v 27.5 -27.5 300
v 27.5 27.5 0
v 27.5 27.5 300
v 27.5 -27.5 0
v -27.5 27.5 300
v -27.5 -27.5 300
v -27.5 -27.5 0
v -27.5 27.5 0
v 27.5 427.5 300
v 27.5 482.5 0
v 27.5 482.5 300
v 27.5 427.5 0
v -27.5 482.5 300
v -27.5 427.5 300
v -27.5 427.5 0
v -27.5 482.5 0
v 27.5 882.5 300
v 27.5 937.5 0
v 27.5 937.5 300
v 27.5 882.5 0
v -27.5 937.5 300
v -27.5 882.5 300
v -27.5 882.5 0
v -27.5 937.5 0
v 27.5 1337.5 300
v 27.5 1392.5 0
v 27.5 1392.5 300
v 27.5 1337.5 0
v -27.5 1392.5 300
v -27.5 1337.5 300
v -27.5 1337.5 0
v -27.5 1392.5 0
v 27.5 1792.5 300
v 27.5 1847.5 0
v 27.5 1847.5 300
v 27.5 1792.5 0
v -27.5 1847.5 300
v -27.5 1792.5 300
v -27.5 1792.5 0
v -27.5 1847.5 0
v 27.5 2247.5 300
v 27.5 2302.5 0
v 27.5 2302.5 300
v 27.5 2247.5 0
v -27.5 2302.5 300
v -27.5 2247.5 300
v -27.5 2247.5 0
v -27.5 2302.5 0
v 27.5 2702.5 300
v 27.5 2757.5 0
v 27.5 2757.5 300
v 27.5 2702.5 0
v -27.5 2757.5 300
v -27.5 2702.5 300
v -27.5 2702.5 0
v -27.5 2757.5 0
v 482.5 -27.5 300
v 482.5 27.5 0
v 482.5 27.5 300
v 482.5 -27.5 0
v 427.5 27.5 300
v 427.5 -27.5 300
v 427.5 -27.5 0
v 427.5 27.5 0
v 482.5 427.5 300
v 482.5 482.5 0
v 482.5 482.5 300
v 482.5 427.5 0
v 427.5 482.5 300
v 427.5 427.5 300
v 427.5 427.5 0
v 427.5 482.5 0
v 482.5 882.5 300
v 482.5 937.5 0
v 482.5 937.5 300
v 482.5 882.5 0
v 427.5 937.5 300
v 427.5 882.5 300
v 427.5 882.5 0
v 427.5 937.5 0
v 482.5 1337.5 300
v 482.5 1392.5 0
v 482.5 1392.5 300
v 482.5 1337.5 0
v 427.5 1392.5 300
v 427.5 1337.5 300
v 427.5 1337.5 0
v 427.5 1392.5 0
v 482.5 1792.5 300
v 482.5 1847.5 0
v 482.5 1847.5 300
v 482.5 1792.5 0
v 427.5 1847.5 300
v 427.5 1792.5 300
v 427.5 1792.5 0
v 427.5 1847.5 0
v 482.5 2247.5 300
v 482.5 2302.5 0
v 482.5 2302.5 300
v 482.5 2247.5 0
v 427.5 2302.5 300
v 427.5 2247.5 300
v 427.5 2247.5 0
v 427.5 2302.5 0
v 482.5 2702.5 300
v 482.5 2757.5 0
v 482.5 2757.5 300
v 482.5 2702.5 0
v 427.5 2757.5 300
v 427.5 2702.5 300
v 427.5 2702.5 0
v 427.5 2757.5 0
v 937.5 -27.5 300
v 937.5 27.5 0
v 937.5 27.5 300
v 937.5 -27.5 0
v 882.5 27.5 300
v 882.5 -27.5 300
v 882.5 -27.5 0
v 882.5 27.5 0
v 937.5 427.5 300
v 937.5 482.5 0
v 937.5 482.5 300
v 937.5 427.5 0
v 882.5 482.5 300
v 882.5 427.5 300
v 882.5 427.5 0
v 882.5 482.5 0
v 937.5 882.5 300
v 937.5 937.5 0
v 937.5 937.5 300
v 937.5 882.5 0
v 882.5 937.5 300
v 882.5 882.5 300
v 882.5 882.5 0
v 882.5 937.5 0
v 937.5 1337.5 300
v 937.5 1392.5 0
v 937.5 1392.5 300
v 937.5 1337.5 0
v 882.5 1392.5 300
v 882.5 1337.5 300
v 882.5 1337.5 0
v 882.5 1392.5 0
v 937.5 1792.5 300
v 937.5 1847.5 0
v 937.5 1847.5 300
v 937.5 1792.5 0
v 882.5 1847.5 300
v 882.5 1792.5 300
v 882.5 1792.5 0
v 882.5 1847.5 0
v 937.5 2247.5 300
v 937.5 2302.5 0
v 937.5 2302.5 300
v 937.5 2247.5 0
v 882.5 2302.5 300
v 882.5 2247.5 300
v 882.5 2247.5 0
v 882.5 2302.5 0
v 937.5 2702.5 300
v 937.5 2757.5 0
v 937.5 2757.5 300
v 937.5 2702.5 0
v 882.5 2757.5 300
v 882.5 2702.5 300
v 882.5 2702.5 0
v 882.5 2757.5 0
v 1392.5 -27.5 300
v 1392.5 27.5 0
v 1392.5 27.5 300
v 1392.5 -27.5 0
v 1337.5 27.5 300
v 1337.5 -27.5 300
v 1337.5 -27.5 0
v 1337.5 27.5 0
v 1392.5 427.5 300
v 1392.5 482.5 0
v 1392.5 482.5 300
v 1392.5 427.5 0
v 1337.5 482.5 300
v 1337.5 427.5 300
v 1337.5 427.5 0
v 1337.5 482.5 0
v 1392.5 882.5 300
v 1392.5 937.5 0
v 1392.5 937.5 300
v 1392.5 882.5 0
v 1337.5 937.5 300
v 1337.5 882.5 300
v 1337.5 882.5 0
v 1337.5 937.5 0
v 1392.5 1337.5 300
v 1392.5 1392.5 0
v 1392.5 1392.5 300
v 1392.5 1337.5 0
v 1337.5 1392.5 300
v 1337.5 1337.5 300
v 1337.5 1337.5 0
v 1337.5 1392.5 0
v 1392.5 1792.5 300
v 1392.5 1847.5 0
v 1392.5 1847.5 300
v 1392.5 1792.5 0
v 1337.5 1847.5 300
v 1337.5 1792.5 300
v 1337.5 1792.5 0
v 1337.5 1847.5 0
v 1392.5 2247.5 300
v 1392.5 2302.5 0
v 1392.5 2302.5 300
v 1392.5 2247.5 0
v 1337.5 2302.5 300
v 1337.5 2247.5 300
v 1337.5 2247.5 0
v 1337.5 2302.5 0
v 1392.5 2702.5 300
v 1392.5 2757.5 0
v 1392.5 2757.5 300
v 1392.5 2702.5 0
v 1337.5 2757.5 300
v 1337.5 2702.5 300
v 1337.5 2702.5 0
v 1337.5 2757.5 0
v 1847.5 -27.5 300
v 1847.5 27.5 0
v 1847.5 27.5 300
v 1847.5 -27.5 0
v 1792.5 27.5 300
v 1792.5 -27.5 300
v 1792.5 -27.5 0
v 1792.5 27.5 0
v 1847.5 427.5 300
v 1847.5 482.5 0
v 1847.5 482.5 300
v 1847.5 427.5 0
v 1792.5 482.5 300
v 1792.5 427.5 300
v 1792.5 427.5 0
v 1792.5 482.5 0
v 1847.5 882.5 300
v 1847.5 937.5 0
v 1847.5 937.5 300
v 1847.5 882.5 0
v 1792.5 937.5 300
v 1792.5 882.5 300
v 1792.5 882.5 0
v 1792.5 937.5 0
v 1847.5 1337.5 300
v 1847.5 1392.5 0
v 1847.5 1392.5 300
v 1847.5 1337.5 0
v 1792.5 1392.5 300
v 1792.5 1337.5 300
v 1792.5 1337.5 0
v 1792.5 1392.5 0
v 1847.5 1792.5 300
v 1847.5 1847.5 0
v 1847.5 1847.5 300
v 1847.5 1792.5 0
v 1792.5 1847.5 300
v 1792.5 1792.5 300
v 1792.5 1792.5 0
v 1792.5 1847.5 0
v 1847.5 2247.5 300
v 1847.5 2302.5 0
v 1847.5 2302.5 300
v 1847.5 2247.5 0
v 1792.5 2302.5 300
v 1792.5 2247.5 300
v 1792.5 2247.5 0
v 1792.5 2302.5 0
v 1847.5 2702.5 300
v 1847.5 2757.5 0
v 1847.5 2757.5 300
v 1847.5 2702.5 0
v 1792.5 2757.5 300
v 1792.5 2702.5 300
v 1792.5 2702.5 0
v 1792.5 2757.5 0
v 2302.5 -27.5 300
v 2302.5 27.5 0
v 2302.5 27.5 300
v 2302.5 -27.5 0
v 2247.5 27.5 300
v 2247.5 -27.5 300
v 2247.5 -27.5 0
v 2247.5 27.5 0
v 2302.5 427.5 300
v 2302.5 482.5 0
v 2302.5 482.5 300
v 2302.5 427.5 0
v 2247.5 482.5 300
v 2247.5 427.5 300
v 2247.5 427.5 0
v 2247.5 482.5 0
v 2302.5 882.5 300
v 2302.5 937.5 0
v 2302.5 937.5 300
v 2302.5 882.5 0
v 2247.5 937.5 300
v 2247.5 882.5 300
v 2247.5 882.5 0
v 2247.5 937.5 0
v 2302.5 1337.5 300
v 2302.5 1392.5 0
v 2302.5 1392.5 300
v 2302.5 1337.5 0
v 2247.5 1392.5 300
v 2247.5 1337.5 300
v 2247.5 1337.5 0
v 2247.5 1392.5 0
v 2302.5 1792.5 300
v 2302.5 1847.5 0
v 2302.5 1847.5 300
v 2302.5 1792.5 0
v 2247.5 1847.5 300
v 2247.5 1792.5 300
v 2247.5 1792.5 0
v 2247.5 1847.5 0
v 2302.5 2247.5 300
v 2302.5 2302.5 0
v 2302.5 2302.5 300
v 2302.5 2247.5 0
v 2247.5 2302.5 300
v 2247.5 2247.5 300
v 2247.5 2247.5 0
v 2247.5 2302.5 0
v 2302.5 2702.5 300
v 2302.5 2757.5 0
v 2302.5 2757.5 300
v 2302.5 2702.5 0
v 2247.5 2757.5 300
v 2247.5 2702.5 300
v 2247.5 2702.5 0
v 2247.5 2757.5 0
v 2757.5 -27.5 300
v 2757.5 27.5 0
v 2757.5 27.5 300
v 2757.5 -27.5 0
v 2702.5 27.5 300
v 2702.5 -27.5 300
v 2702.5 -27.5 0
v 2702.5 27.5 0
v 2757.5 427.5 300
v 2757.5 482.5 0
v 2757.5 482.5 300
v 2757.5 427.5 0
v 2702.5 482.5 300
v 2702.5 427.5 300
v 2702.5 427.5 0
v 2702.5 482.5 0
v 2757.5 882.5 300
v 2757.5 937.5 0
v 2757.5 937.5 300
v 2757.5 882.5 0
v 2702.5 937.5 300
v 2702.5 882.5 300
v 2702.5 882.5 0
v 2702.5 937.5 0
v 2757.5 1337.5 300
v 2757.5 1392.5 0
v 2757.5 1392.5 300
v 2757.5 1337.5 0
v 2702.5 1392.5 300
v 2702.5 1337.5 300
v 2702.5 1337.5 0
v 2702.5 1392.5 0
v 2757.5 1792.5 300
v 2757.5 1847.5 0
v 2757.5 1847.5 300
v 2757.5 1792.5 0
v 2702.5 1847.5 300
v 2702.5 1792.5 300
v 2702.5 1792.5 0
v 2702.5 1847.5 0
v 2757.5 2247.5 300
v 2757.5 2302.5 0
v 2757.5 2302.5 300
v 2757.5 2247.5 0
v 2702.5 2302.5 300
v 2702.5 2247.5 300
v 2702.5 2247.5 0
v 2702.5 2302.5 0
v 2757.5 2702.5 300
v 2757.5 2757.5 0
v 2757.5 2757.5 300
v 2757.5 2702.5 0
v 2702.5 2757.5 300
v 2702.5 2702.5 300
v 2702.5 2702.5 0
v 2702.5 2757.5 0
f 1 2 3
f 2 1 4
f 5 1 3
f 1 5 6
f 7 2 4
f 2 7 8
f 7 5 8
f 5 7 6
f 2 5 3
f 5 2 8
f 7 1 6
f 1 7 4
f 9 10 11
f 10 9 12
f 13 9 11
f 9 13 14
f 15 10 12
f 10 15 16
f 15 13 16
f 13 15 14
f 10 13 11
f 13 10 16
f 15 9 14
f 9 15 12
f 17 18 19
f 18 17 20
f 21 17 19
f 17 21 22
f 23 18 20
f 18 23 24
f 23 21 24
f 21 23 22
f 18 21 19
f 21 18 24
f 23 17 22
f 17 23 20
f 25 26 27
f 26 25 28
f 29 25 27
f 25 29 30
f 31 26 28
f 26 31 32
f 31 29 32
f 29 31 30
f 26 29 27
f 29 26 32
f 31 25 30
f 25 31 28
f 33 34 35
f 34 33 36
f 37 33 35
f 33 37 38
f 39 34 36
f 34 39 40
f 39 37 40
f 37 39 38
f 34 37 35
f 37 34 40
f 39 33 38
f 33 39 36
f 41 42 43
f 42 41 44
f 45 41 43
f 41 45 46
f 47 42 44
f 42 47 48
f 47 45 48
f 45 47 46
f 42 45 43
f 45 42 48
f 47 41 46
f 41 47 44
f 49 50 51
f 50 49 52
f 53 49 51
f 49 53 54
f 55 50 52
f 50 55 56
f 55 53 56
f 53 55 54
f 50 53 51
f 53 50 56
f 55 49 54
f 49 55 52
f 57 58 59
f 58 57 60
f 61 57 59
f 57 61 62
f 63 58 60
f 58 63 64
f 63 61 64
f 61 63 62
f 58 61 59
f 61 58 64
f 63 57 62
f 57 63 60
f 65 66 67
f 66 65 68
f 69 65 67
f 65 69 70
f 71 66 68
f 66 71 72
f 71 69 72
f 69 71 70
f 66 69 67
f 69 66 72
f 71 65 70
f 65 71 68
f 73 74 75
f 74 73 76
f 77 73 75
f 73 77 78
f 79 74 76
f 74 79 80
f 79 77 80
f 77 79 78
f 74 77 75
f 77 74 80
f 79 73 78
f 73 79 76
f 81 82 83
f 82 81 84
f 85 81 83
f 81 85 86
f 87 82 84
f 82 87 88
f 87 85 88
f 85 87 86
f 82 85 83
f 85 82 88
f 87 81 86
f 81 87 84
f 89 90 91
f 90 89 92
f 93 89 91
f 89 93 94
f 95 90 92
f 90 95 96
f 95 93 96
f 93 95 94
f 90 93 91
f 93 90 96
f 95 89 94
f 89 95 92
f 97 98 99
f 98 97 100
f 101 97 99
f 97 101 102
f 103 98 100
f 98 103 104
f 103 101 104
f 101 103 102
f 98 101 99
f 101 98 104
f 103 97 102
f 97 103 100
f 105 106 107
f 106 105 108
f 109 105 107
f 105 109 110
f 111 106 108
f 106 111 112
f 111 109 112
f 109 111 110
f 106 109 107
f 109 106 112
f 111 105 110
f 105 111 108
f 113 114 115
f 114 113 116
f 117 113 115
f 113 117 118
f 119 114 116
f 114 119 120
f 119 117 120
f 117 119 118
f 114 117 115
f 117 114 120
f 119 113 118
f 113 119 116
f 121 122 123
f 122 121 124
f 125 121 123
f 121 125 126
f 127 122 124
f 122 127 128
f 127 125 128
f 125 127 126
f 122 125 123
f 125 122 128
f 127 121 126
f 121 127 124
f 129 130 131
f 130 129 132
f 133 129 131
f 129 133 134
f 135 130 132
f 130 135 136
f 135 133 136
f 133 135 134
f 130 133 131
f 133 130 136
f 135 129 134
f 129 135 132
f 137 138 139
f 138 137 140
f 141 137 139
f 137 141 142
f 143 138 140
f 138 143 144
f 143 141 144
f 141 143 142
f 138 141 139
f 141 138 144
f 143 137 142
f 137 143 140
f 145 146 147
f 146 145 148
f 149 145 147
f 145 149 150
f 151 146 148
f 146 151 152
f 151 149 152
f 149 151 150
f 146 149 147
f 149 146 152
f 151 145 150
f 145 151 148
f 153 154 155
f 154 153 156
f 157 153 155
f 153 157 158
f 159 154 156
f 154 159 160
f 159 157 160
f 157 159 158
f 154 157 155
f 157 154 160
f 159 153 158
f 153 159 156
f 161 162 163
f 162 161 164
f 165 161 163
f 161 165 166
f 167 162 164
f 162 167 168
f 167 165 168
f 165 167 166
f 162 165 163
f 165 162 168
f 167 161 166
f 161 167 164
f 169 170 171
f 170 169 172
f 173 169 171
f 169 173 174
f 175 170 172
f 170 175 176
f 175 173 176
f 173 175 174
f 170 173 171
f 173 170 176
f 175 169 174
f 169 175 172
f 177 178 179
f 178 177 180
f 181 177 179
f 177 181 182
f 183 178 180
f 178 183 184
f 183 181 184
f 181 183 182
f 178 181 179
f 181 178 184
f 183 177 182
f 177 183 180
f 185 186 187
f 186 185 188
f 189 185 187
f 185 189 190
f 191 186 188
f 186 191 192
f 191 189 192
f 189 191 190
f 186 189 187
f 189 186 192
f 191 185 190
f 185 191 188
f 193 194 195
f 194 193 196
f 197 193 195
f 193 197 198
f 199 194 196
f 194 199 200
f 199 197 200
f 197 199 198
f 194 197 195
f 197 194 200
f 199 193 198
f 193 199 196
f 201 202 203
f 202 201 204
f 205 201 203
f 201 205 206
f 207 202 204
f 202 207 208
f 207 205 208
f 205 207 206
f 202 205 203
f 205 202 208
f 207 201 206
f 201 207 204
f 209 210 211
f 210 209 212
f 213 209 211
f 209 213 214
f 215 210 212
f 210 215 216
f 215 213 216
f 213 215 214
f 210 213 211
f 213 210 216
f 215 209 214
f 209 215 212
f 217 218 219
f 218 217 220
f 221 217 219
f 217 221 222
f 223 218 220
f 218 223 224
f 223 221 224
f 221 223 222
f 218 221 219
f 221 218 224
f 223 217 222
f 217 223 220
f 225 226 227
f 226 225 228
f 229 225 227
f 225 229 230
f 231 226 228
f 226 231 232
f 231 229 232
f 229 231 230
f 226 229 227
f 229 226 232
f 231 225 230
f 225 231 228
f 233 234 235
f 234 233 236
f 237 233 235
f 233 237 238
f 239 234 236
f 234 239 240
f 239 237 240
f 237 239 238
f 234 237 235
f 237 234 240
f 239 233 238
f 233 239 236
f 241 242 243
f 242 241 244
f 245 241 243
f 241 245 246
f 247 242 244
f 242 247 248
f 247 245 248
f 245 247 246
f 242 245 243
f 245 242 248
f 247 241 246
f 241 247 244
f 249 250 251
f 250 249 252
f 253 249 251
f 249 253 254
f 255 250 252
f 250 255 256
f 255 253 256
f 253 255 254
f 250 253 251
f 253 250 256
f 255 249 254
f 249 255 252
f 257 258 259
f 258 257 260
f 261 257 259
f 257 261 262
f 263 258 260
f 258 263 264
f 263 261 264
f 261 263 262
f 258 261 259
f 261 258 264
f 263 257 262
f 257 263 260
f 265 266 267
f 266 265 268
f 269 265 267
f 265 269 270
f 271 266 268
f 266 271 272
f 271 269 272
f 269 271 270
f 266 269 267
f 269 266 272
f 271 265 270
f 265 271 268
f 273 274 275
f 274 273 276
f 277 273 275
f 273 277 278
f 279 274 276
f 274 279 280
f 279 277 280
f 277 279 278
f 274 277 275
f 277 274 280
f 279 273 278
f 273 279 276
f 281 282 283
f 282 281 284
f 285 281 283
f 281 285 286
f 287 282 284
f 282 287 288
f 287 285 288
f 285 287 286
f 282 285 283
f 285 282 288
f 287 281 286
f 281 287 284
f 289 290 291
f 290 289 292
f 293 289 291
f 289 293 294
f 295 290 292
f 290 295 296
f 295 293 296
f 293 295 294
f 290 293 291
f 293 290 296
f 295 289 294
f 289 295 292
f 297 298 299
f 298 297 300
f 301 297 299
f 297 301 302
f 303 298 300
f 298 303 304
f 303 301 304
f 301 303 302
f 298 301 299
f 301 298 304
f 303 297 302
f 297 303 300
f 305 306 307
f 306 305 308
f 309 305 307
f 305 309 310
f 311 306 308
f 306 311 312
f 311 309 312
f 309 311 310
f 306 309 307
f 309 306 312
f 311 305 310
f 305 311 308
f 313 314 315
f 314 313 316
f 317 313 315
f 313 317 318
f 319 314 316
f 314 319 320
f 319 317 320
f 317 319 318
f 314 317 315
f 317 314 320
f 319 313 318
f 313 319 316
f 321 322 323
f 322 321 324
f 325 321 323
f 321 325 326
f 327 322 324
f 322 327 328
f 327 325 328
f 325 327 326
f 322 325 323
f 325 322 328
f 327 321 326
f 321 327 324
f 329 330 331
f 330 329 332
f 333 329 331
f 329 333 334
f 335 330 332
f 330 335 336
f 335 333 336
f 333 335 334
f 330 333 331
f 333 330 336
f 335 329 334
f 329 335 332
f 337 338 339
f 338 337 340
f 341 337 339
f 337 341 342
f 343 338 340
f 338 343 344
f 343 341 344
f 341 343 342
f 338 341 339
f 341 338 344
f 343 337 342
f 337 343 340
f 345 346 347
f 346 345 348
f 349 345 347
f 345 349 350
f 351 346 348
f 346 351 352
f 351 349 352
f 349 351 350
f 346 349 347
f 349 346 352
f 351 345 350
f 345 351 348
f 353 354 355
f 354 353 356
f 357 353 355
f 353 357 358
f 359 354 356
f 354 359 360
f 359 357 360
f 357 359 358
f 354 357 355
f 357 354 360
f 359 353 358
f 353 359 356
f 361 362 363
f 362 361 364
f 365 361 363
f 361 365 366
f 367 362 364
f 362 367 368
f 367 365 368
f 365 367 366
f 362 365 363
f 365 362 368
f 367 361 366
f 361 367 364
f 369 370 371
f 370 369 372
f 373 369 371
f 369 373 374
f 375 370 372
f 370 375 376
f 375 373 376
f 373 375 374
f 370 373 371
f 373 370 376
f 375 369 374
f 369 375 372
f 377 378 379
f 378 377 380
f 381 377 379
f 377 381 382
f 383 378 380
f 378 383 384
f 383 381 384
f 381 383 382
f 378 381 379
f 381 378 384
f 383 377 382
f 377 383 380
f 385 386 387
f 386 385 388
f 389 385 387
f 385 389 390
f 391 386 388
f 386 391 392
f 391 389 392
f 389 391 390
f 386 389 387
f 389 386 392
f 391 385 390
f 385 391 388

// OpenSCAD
// OpenSCAD script to generate an array of square blocks
module block() {
  cube([55, 55, 300], center = true);
}
translate([0, 0, 0])
{
translate([0, 0, 150.0]) block();
translate([0, 455, 150.0]) block();
translate([0, 910, 150.0]) block();
translate([0, 1365, 150.0]) block();
translate([0, 1820, 150.0]) block();
translate([0, 2275, 150.0]) block();
translate([0, 2730, 150.0]) block();
translate([455, 0, 150.0]) block();
translate([455, 455, 150.0]) block();
translate([455, 910, 150.0]) block();
translate([455, 1365, 150.0]) block();
translate([455, 1820, 150.0]) block();
translate([455, 2275, 150.0]) block();
translate([455, 2730, 150.0]) block();
translate([910, 0, 150.0]) block();
translate([910, 455, 150.0]) block();
translate([910, 910, 150.0]) block();
translate([910, 1365, 150.0]) block();
translate([910, 1820, 150.0]) block();
translate([910, 2275, 150.0]) block();
translate([910, 2730, 150.0]) block();
translate([1365, 0, 150.0]) block();
translate([1365, 455, 150.0]) block();
translate([1365, 910, 150.0]) block();
translate([1365, 1365, 150.0]) block();
translate([1365, 1820, 150.0]) block();
translate([1365, 2275, 150.0]) block();
translate([1365, 2730, 150.0]) block();
translate([1820, 0, 150.0]) block();
translate([1820, 455, 150.0]) block();
translate([1820, 910, 150.0]) block();
translate([1820, 1365, 150.0]) block();
translate([1820, 1820, 150.0]) block();
translate([1820, 2275, 150.0]) block();
translate([1820, 2730, 150.0]) block();
translate([2275, 0, 150.0]) block();
translate([2275, 455, 150.0]) block();
translate([2275, 910, 150.0]) block();
translate([2275, 1365, 150.0]) block();
translate([2275, 1820, 150.0]) block();
translate([2275, 2275, 150.0]) block();
translate([2275, 2730, 150.0]) block();
translate([2730, 0, 150.0]) block();
translate([2730, 455, 150.0]) block();
translate([2730, 910, 150.0]) block();
translate([2730, 1365, 150.0]) block();
translate([2730, 1820, 150.0]) block();
translate([2730, 2275, 150.0]) block();
translate([2730, 2730, 150.0]) block();
}
